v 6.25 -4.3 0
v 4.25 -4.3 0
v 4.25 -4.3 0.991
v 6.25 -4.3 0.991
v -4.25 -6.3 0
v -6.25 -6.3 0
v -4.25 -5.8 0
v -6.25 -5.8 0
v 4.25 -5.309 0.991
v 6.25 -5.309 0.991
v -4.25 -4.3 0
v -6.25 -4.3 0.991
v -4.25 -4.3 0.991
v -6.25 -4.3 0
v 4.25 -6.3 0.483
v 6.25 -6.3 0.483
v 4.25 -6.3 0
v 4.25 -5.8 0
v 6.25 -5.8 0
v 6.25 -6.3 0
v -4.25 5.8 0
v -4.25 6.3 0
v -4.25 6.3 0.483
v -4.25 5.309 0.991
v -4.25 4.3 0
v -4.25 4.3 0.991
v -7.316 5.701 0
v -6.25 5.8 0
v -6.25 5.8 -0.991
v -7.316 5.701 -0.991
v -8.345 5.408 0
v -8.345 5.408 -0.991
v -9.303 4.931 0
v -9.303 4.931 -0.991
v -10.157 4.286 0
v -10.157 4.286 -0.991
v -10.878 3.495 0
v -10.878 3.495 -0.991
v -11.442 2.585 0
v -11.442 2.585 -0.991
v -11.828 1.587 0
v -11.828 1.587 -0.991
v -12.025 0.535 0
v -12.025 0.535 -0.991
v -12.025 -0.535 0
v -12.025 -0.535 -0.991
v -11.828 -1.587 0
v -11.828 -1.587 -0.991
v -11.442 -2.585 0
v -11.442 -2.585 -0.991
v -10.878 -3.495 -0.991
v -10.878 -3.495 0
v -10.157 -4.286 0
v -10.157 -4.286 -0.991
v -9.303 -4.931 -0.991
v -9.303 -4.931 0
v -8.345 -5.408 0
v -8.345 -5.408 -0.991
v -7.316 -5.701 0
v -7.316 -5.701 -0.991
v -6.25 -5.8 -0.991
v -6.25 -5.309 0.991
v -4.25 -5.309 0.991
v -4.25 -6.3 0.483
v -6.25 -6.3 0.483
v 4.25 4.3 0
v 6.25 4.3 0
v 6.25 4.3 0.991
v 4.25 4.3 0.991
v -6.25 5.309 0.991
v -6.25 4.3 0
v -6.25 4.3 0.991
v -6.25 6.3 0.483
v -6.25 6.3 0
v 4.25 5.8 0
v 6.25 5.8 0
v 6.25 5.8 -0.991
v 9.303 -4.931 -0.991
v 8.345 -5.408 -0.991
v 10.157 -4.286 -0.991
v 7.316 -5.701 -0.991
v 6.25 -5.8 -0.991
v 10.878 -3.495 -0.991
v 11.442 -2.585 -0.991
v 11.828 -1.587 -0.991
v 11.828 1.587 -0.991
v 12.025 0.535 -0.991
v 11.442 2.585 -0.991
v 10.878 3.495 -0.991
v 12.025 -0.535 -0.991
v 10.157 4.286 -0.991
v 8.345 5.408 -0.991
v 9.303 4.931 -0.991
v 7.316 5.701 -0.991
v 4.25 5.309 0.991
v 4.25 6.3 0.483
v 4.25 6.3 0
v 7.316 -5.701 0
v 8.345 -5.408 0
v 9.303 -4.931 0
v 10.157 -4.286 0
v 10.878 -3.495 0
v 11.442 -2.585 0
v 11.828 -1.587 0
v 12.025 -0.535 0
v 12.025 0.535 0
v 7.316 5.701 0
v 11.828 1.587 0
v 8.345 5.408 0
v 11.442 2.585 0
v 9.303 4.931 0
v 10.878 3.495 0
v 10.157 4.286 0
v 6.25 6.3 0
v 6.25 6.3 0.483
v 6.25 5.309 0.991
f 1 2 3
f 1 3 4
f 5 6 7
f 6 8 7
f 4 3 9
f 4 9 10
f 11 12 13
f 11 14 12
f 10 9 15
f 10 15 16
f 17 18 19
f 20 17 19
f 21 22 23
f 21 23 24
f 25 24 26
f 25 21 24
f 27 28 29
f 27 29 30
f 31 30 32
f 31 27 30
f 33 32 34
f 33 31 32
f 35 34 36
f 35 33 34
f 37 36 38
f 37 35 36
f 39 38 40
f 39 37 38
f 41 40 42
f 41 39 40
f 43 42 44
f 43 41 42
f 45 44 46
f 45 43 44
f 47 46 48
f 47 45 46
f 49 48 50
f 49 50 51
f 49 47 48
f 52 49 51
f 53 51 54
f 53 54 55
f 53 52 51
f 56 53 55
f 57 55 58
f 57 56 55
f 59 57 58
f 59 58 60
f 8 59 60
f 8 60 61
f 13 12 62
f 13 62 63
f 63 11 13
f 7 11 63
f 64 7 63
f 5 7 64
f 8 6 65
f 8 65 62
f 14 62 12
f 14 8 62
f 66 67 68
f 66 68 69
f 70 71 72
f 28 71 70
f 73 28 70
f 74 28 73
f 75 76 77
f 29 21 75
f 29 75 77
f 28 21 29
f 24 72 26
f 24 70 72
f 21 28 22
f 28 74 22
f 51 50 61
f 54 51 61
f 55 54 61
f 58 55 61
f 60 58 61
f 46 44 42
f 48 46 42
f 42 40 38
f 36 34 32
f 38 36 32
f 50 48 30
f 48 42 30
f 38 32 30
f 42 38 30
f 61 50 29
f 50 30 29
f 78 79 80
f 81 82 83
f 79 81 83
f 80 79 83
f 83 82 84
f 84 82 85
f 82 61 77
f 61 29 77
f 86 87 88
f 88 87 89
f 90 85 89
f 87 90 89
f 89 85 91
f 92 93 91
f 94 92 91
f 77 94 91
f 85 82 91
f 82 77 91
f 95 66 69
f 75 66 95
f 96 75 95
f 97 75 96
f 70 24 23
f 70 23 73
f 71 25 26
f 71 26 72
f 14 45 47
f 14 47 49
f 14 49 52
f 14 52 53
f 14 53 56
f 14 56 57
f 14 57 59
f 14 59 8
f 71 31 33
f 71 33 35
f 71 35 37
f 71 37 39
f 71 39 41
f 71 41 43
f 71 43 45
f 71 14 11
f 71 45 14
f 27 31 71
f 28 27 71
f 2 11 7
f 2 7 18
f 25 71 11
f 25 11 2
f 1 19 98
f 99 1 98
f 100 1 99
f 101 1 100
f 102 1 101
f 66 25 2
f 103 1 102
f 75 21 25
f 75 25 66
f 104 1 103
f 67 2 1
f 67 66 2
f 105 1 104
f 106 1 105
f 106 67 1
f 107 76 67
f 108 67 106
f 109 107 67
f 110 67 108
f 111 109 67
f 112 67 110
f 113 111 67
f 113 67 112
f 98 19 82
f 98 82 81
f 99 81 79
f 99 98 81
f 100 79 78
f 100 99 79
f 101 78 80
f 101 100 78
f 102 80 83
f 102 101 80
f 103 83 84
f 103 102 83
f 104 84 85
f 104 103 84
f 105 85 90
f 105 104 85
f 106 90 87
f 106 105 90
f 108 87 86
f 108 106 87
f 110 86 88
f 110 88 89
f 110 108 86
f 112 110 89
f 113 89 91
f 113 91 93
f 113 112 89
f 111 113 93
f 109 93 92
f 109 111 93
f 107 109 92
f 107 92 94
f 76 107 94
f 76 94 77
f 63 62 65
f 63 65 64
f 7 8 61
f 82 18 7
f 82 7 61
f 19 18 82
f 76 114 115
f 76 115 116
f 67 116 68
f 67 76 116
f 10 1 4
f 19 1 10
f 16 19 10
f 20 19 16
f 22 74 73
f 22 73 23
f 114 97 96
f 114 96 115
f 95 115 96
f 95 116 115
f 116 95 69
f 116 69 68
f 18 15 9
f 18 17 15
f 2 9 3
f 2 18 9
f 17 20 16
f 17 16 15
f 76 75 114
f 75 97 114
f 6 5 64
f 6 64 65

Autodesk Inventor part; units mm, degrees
ref_plane "YZ Plane" through (0, 0, 0) normal (1, 0, 0) x (0, 1, 0)
ref_plane "XZ Plane" through (0, 0, 0) normal (0, 1, 0) x (-1, 0, 0)
ref_plane "XY Plane" through (0, 0, 0) normal (0, 0, 1) x (1, 0, 0)
sketch "Sketch1" plane through (0, 0, 0) normal (0, 0, 1) x (1, 0, 0)
  line L0 (-6.25, -5.7997) -> (6.25, -5.7997)
  arc A0 (6.25, -5.7997) -> (6.25, 5.7997) centre (6.25, 0) ccw
  line L1 (6.25, 5.7997) -> (-6.25, 5.7997)
  arc A1 (-6.25, 5.7997) -> (-6.25, -5.7997) centre (-6.25, 0) ccw
  point P0 (0, 0)
  point P1 (0, 0)
extrude "Extrusion1" add sketch "Sketch1" against normal blind 0.9906
sketch "Sketch2" plane through (0, 0, 0) normal (0, 0, 1) x (1, 0, 0)
  line L0 (-6.25, 6.2997) -> (-4.25, 6.2997)
  line L1 (-6.25, 5.7997) -> (-6.25, 6.2997)
  line L2 (-4.25, 5.7997) -> (-6.25, 5.7997)
  line L3 (-4.25, 6.2997) -> (-4.25, 5.7997)
  line L4 (-6.25, 4.2997) -> (-6.25, 5.7997)
  line L5 (-4.25, 5.7997) -> (-4.25, 4.2997)
  line L6 (-4.25, 4.2997) -> (-6.25, 4.2997)
  line L7 (4.25, 6.2997) -> (6.25, 6.2997)
  line L8 (4.25, 5.7997) -> (4.25, 6.2997)
  line L9 (6.25, 6.2997) -> (6.25, 5.7997)
  line L10 (4.25, 4.2997) -> (4.25, 5.7997)
  line L11 (6.25, 5.7997) -> (6.25, 4.2997)
  line L12 (6.25, 4.2997) -> (4.25, 4.2997)
  line L13 (-4.25, -6.2997) -> (-6.25, -6.2997)
  line L14 (-4.25, -5.7997) -> (-4.25, -6.2997)
  line L15 (-6.25, -5.7997) -> (-4.25, -5.7997)
  line L16 (-6.25, -6.2997) -> (-6.25, -5.7997)
  line L17 (-6.25, -5.7997) -> (-6.25, -4.2997)
  line L18 (-6.25, -4.2997) -> (-4.25, -4.2997)
  line L19 (-4.25, -4.2997) -> (-4.25, -5.7997)
  line L20 (6.25, -5.2997) -> (6.25, -6.2997)
  line L21 (4.25, -6.2997) -> (4.25, -5.7997)
  line L22 (6.25, -6.2997) -> (4.25, -6.2997)
  line L23 (4.25, -5.7997) -> (4.25, -4.2997)
  line L24 (4.25, -4.2997) -> (6.25, -4.2997)
  line L25 (6.25, -4.2997) -> (6.25, -5.7997)
  point P0 (0, 0)
  point P1 (6.25, 0)
  point P2 (-6.25, 0)
  point P3 (0, 0)
extrude "Extrusion2" add sketch "Sketch2" along normal blind 0.9906
chamfer "Chamfer1" distance 0.508 distance2 0.9906 1 edges at (-5.25, 6.2997, 0.9906) measured on face at (-4.9167, 6.2997, 0.3302)
chamfer "Chamfer2" distance 0.508 distance2 0.9906 1 edges at (5.25, 6.2997, 0.9906) measured on face at (5.5833, 6.2997, 0.3302)
chamfer "Chamfer3" distance 0.508 distance2 0.9906 1 edges at (5.25, -6.2997, 0.9906) measured on face at (4.9167, -6.2997, 0.3302)
chamfer "Chamfer4" distance 0.508 distance2 0.9906 1 edges at (-5.25, -6.2997, 0.9906) measured on face at (-5.5833, -6.2997, 0.3302)
properties part number "276-2243" material "ABS Plastic"
